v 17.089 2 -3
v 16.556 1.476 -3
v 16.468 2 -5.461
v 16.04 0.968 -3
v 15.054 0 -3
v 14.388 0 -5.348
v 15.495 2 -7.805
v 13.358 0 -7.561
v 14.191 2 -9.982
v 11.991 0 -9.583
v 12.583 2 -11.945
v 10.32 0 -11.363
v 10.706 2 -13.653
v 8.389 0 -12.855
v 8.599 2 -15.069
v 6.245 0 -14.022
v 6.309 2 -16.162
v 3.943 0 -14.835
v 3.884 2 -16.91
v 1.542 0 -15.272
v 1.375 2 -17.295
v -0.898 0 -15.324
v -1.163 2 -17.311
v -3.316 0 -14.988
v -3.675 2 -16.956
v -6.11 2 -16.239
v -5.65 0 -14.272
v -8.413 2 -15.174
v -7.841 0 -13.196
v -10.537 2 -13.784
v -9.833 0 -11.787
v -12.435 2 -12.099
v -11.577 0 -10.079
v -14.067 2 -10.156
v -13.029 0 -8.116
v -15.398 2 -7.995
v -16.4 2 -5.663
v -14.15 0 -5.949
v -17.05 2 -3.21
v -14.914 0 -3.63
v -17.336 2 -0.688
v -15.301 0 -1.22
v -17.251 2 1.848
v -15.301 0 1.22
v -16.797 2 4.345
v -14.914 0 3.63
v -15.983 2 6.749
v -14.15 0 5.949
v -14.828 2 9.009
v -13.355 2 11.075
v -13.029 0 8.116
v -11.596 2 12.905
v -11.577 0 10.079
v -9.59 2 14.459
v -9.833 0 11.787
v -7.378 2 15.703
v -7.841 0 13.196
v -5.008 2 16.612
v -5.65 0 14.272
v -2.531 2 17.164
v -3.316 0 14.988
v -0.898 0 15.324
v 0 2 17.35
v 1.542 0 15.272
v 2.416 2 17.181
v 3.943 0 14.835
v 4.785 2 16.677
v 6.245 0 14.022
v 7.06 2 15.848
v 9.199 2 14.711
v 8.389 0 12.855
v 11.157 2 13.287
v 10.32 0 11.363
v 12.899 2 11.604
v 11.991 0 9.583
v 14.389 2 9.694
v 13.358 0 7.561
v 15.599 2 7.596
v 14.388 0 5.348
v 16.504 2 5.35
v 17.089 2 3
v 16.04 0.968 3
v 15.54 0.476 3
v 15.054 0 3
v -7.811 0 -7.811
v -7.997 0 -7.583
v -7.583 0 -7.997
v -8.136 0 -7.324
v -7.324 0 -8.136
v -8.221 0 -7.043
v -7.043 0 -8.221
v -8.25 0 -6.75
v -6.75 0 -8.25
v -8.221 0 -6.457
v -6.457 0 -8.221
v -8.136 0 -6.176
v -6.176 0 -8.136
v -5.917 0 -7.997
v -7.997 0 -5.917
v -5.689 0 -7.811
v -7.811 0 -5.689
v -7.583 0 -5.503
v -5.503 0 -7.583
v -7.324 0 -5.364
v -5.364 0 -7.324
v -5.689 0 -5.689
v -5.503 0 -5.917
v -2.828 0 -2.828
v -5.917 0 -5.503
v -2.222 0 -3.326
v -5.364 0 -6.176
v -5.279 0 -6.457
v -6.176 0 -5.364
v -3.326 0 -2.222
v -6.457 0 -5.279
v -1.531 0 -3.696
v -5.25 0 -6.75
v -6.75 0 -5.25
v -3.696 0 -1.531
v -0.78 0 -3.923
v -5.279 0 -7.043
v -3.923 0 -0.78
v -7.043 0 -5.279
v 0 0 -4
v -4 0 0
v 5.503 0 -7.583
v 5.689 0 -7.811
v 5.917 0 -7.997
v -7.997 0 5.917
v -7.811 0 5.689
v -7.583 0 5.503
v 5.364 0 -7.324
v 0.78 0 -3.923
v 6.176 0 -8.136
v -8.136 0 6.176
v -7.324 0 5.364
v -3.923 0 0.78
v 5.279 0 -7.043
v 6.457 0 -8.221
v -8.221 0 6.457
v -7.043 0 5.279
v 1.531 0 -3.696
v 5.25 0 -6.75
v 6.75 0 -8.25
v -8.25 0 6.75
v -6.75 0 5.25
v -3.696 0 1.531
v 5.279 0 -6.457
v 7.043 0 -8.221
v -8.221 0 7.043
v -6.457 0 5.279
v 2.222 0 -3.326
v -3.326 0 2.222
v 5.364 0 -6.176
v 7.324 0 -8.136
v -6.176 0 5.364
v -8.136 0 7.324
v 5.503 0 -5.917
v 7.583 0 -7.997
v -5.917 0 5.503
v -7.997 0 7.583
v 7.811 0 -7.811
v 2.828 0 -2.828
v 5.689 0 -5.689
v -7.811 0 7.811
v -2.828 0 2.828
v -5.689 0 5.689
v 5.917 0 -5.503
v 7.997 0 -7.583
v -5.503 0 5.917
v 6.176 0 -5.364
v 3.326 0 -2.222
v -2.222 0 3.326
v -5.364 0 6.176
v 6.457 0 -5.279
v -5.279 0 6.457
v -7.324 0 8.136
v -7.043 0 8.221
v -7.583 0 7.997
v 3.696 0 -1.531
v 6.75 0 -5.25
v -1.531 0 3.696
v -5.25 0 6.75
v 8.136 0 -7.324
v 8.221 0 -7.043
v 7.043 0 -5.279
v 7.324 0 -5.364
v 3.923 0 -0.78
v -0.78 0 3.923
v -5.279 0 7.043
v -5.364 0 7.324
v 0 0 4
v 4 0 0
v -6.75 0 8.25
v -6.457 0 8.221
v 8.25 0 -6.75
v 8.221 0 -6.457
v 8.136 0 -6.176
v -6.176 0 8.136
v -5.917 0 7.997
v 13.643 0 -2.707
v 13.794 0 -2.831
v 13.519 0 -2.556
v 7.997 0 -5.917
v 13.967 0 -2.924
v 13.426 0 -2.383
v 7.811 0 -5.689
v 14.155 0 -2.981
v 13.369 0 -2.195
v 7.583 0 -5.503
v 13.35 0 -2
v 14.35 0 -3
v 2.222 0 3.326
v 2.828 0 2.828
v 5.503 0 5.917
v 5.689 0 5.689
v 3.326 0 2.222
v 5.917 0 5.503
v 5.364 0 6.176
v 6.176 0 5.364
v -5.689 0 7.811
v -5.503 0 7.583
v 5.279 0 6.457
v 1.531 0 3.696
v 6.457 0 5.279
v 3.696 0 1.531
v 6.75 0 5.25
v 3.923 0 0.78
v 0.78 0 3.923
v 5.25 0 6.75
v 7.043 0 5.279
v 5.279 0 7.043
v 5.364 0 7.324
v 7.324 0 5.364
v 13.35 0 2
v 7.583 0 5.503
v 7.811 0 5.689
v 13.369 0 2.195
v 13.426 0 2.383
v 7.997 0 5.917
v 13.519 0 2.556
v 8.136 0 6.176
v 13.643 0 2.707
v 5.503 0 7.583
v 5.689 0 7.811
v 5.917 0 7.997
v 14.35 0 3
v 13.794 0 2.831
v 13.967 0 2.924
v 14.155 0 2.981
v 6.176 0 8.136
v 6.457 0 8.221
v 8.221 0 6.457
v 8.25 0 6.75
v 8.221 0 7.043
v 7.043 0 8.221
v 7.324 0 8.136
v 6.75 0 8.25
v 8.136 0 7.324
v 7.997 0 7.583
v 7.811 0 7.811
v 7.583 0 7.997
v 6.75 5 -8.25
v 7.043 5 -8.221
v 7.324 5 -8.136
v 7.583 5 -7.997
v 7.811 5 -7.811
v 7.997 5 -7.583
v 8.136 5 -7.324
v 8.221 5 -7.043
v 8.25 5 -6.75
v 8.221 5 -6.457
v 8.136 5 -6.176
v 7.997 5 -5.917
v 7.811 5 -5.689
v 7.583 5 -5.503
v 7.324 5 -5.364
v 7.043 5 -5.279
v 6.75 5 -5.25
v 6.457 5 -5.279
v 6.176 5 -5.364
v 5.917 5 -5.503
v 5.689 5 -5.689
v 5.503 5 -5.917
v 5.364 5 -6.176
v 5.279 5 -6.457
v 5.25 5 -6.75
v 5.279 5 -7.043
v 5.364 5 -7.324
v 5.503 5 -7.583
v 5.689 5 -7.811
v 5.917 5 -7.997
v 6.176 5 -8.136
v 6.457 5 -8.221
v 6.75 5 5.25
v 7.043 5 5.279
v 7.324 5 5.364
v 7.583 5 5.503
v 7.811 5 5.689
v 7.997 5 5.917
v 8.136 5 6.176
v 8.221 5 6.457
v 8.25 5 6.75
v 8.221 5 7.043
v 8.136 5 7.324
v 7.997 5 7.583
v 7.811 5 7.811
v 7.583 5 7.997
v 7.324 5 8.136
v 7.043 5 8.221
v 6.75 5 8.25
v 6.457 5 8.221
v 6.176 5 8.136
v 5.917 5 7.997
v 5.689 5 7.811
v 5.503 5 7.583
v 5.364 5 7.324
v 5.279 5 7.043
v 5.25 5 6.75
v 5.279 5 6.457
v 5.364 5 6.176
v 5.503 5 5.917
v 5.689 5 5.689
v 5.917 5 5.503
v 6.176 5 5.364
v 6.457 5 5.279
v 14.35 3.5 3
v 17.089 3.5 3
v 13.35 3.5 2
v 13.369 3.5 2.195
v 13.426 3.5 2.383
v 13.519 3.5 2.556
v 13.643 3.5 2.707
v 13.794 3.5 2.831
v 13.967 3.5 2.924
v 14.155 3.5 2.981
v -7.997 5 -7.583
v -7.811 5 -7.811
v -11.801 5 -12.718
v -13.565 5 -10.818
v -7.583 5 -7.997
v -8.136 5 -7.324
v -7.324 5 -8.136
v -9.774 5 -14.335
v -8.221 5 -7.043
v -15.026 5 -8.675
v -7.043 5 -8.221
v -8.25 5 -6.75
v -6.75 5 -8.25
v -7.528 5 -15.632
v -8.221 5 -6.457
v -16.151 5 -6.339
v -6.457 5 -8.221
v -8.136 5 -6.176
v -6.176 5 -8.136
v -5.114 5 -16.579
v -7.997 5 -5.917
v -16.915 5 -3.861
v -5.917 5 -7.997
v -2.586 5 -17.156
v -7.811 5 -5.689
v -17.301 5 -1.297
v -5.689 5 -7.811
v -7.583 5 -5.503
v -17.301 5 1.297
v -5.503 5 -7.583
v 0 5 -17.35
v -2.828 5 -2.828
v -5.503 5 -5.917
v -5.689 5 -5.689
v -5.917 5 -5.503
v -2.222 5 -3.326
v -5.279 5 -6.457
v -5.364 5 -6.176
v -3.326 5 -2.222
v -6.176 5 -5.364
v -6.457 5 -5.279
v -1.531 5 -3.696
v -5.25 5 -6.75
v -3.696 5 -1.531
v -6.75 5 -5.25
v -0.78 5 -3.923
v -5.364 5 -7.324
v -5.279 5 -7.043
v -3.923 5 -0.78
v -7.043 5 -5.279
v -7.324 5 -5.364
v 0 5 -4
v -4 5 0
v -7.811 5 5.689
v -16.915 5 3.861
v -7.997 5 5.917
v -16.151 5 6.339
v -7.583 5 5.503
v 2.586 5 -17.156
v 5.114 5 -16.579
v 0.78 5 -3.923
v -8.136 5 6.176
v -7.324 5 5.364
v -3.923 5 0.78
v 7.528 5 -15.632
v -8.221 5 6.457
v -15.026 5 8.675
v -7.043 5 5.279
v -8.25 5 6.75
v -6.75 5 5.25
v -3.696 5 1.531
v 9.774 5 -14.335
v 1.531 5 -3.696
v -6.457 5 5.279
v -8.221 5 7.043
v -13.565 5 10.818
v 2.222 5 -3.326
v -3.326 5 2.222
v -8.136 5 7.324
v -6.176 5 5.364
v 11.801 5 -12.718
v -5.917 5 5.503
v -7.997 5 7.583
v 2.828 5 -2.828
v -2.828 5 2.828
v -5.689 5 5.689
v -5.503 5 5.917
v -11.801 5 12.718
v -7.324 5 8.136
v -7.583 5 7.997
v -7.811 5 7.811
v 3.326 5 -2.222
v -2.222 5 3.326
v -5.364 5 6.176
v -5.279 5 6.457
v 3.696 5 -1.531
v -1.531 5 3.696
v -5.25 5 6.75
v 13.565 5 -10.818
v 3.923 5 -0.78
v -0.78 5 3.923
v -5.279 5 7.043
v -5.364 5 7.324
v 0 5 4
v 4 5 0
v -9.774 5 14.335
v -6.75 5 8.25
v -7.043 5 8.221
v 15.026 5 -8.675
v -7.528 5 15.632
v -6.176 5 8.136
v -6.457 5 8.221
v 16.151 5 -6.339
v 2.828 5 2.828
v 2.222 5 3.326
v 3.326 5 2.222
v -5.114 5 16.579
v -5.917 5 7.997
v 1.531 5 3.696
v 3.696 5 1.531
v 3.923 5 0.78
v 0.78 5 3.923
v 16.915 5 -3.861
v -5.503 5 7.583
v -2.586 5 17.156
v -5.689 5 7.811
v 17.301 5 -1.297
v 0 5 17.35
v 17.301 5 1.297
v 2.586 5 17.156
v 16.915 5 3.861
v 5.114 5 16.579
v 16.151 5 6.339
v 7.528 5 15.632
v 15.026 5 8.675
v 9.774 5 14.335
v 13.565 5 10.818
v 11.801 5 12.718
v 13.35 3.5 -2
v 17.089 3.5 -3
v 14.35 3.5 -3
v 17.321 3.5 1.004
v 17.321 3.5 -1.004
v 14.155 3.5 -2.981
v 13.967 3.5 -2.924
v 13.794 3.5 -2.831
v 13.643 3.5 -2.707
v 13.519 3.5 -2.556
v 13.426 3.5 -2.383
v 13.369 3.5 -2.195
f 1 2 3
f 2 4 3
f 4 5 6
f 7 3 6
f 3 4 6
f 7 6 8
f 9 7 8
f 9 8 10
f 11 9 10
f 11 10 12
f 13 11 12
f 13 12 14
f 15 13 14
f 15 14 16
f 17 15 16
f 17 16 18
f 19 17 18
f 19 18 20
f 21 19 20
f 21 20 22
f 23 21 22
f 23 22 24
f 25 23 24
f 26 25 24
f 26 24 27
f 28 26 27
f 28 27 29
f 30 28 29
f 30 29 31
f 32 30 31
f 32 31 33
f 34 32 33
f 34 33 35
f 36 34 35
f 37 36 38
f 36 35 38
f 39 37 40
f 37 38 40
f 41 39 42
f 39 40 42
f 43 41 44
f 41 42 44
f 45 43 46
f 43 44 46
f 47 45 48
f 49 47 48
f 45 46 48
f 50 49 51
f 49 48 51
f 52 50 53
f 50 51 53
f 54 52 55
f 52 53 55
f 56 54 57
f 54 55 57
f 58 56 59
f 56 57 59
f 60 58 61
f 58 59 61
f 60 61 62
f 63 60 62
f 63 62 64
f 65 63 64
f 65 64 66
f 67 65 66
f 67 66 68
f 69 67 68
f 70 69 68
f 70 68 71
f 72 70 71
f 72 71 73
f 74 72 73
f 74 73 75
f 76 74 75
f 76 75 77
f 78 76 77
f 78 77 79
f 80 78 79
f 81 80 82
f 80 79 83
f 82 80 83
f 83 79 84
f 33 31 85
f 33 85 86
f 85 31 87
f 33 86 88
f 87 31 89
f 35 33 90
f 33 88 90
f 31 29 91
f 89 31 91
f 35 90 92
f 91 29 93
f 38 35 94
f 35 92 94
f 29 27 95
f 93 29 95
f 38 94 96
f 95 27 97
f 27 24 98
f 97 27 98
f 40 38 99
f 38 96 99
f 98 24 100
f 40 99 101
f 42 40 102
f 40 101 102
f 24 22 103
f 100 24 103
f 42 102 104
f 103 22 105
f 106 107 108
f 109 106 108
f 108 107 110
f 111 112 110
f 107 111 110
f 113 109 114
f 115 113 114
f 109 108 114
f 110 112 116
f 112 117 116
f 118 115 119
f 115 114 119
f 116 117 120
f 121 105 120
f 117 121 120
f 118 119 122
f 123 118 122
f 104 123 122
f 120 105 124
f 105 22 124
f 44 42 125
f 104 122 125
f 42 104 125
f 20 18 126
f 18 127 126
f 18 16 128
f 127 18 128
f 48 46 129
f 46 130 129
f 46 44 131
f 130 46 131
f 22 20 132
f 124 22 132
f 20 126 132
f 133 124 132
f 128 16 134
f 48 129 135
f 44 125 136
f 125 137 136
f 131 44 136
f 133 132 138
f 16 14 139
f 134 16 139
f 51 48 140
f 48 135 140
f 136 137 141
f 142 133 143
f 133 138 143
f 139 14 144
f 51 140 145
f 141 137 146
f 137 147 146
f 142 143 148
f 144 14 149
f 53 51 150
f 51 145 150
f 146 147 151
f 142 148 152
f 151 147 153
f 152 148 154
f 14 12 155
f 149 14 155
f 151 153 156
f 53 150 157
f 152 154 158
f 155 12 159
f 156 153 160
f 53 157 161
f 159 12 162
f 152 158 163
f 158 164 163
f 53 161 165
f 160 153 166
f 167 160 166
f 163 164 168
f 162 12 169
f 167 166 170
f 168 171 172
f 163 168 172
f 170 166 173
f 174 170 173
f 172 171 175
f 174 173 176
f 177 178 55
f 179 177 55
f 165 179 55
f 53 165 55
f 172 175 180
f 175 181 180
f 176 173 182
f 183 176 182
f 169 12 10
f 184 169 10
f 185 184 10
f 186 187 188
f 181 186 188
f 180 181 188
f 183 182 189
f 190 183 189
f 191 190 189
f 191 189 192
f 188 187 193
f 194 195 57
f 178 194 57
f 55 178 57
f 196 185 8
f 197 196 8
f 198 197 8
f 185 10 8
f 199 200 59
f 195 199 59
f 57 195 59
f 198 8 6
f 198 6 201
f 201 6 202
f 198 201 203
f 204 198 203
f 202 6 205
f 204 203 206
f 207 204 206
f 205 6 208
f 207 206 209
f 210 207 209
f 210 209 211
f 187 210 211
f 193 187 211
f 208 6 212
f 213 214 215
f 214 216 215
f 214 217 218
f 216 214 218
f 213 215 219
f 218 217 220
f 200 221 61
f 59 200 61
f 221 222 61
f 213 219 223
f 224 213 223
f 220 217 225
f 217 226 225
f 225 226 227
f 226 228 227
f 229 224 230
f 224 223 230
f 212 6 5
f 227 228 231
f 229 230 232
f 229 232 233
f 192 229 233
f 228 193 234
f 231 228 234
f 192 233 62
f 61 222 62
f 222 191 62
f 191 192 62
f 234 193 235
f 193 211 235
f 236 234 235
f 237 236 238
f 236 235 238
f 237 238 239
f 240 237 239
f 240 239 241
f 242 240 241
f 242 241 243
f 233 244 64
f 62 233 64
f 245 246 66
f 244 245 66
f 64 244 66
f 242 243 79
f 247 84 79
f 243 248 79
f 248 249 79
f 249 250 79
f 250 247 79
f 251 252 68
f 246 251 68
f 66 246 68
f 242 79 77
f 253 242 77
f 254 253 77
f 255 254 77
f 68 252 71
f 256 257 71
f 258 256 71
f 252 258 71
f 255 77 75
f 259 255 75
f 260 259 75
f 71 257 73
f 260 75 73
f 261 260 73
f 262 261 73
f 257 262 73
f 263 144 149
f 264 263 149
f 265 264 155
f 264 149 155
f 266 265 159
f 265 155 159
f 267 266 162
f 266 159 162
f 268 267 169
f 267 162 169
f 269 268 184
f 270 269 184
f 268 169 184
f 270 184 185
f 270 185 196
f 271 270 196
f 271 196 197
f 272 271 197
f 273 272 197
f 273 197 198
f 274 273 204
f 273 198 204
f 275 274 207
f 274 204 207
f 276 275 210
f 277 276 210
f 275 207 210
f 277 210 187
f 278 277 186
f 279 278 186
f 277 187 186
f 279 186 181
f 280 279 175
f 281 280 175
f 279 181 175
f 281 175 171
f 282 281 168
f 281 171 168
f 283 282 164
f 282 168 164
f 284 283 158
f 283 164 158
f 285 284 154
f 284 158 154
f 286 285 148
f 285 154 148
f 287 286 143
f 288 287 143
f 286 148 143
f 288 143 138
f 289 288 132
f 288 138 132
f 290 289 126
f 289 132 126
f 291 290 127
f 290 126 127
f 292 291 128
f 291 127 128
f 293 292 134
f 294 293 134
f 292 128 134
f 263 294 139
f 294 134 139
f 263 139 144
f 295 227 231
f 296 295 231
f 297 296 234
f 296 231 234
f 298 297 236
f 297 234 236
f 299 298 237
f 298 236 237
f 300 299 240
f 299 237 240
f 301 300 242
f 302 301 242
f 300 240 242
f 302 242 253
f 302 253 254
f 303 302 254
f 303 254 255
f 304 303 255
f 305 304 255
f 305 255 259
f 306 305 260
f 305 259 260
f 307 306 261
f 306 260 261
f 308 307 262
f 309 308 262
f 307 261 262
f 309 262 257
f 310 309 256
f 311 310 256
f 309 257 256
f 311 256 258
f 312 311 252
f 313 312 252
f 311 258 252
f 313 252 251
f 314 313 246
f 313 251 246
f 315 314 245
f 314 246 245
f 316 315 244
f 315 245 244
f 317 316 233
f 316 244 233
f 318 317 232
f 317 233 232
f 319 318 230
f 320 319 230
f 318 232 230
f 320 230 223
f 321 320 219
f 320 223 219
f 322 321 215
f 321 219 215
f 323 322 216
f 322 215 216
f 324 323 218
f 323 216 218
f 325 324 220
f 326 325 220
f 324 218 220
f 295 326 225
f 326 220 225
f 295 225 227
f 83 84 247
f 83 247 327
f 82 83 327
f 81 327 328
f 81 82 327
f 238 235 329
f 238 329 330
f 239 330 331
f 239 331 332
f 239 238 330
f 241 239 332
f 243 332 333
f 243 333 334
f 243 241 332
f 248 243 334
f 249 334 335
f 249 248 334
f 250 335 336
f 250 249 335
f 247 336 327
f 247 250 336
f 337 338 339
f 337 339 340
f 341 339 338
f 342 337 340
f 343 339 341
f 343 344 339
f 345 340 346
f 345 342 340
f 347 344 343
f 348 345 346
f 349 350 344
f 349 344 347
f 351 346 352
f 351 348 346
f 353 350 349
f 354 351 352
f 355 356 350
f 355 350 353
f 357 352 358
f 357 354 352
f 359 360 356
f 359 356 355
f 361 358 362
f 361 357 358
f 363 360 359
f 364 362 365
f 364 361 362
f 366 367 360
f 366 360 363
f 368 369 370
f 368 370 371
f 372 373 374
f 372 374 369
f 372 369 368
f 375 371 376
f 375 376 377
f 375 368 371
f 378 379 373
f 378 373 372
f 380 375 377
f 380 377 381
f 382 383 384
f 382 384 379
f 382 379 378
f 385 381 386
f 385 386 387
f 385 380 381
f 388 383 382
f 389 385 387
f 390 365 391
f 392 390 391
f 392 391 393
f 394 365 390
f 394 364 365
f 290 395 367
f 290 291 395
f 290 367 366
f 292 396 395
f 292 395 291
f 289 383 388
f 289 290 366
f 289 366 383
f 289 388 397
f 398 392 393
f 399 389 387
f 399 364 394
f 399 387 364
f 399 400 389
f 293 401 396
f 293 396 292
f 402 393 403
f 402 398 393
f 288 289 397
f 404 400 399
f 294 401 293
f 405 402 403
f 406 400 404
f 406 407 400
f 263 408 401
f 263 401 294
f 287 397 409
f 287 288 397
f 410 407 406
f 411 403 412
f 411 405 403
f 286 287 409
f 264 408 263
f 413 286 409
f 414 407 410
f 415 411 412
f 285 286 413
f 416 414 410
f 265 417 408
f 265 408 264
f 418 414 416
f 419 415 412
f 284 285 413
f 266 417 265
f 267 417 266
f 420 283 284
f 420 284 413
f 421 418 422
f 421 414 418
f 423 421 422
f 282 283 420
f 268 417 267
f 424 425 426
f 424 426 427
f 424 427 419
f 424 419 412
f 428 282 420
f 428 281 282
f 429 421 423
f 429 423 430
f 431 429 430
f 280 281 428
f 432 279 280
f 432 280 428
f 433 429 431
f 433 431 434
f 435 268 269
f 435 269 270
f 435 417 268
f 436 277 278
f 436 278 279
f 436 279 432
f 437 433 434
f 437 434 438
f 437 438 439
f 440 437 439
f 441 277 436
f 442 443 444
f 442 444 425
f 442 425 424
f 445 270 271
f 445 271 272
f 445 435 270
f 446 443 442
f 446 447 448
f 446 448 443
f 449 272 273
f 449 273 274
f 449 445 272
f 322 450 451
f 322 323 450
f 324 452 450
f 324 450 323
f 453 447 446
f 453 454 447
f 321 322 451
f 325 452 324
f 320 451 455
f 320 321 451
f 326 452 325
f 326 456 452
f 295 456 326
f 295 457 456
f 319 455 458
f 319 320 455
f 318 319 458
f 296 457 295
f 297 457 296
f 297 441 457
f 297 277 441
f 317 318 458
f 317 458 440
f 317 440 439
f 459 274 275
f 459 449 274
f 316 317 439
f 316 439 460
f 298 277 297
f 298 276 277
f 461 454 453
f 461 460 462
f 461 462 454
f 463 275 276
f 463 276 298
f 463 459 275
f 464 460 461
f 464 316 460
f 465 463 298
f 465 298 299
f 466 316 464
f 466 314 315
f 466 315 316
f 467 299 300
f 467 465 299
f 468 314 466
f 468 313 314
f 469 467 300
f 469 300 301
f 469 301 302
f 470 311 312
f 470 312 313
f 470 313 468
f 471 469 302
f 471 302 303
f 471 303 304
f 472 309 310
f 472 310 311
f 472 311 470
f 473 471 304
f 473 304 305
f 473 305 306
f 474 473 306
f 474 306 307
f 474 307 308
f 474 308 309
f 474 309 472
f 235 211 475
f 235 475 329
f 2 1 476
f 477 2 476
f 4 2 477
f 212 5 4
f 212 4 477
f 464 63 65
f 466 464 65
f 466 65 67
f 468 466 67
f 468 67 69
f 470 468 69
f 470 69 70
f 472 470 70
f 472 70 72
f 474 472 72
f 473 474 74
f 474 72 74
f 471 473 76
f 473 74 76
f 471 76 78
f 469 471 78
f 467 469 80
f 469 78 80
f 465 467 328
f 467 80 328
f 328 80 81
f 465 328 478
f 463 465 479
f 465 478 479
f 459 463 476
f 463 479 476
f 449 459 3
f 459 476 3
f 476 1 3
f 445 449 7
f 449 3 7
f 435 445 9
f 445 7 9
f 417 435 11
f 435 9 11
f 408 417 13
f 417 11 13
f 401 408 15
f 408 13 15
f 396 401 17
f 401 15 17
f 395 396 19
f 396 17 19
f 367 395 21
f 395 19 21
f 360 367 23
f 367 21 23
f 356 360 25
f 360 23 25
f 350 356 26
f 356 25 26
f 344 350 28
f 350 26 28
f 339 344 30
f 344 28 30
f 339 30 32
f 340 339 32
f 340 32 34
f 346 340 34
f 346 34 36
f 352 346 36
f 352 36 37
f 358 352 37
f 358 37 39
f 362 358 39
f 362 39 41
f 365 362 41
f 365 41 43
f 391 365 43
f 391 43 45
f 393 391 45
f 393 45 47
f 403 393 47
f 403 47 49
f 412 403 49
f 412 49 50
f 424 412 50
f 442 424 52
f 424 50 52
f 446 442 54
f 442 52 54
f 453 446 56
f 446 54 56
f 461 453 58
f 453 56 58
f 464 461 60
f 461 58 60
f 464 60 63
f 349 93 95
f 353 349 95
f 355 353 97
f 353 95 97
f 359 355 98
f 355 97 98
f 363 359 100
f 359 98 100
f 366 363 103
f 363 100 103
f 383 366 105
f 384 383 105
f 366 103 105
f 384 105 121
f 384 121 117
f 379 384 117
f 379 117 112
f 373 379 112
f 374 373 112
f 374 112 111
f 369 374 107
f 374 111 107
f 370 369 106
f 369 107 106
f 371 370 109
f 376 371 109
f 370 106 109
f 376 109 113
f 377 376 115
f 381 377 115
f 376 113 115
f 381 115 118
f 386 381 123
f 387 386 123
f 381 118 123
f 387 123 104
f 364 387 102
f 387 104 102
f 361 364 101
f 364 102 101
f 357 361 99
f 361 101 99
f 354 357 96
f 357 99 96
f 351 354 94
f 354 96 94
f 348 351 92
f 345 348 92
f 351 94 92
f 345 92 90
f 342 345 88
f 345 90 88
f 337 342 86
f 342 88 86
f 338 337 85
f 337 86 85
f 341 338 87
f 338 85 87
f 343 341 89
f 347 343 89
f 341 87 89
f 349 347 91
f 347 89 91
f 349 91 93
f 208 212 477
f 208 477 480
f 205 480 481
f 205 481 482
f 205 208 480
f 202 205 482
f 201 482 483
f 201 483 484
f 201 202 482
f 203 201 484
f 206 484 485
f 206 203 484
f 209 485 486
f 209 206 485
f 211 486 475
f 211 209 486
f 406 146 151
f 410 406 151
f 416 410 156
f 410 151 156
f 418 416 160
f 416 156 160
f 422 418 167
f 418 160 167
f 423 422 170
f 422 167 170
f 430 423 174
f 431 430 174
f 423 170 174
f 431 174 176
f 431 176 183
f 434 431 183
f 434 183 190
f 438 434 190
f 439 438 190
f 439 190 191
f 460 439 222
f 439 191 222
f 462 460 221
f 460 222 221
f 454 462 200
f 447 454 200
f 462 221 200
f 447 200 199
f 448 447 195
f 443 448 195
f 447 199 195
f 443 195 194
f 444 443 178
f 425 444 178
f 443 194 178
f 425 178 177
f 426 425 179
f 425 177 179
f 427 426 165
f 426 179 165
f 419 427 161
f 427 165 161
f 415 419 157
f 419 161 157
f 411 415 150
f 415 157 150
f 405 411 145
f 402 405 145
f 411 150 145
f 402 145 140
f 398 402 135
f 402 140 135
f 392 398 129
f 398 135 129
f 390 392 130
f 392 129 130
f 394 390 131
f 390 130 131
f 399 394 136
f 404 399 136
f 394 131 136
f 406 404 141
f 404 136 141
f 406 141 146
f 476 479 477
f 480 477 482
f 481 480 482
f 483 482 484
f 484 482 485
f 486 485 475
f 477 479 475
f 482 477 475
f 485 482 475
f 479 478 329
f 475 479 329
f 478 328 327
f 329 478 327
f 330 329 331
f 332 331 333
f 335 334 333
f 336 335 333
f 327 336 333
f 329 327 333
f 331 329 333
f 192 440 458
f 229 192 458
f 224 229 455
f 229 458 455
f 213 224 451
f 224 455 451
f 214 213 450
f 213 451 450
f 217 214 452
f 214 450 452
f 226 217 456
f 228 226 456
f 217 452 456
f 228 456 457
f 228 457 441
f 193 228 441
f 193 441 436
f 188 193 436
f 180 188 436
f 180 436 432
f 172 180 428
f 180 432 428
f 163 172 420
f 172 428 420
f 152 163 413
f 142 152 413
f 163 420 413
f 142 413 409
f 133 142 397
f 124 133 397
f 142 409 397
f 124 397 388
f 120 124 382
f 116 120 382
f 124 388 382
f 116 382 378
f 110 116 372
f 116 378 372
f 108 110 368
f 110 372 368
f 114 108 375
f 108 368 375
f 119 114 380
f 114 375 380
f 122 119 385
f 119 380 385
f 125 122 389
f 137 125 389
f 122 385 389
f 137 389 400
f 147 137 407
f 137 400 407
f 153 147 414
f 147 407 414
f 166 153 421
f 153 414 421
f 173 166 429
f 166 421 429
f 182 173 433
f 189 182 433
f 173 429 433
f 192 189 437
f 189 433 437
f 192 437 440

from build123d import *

# Parameters (mm, degrees)
SKETCH_1_R          = 17.35
EXTRUDE_1_DEPTH     = 5
CHAMFER_1_SIZE      = 2
SKETCH_2_R          = 4
CUT_EXTRUDE_1_DEPTH = 5
SKETCH_3_R          = 1.5
CUT_EXTRUDE_2_DEPTH = 5
CUT_EXTRUDE_3_DEPTH = 3.5


with BuildPart() as part:
    # 草图1 → 凸台-拉伸1 (new body)
    with BuildSketch(Plane(origin=(0, 0, 0), x_dir=(1, 0, 0), z_dir=(0, 1, 0))):
        with Locations(Location((0, 0, 0), (0, 0, 270))):
            Circle(SKETCH_1_R)
    extrude(amount=EXTRUDE_1_DEPTH)

    # 倒角1
    chamfer_1_edges = [part.edges().sort_by_distance(p)[0] for p in [
        (0, 0, -17.35),
    ]]
    chamfer(chamfer_1_edges, length=CHAMFER_1_SIZE)

    # 草图2 → 切除-拉伸1 (cut)
    with BuildSketch(Plane(origin=(0, 5, 0), x_dir=(1, 0, 0), z_dir=(0, 1, 0))):
        with Locations(Location((0, 0, 0), (0, 0, 270))):
            Circle(SKETCH_2_R)
    extrude(amount=-CUT_EXTRUDE_1_DEPTH, mode=Mode.SUBTRACT)

    # 草图3 → 切除-拉伸2 (cut)
    with BuildSketch(Plane.XZ):
        with Locations(Location((-6.75, 6.75, 0), (0, 0, 270))):
            Circle(SKETCH_3_R)
        with Locations(Location((6.75, 6.75, 0), (0, 0, 270))):
            Circle(SKETCH_3_R)
        with Locations(Location((6.75, -6.75, 0), (0, 0, 270))):
            Circle(SKETCH_3_R)
        with Locations(Location((-6.75, -6.75, 0), (0, 0, 270))):
            Circle(SKETCH_3_R)
    extrude(amount=-CUT_EXTRUDE_2_DEPTH, mode=Mode.SUBTRACT)

    # 草图4 → 切除-拉伸3 (cut)
    with BuildSketch(Plane.XZ):
        with BuildLine():
            Line((14.35, 3), (21.35, 3))
            Line((21.35, 3), (21.35, -3))
            Line((21.35, -3), (14.35, -3))
            ThreePointArc((14.35, -3), (13.642893219, -2.707106781), (13.35, -2))
            Line((13.35, -2), (13.35, 2))
            ThreePointArc((13.35, 2), (13.642893219, 2.707106781), (14.35, 3))
        make_face()
    extrude(amount=-CUT_EXTRUDE_3_DEPTH, mode=Mode.SUBTRACT)


solid = part.part
